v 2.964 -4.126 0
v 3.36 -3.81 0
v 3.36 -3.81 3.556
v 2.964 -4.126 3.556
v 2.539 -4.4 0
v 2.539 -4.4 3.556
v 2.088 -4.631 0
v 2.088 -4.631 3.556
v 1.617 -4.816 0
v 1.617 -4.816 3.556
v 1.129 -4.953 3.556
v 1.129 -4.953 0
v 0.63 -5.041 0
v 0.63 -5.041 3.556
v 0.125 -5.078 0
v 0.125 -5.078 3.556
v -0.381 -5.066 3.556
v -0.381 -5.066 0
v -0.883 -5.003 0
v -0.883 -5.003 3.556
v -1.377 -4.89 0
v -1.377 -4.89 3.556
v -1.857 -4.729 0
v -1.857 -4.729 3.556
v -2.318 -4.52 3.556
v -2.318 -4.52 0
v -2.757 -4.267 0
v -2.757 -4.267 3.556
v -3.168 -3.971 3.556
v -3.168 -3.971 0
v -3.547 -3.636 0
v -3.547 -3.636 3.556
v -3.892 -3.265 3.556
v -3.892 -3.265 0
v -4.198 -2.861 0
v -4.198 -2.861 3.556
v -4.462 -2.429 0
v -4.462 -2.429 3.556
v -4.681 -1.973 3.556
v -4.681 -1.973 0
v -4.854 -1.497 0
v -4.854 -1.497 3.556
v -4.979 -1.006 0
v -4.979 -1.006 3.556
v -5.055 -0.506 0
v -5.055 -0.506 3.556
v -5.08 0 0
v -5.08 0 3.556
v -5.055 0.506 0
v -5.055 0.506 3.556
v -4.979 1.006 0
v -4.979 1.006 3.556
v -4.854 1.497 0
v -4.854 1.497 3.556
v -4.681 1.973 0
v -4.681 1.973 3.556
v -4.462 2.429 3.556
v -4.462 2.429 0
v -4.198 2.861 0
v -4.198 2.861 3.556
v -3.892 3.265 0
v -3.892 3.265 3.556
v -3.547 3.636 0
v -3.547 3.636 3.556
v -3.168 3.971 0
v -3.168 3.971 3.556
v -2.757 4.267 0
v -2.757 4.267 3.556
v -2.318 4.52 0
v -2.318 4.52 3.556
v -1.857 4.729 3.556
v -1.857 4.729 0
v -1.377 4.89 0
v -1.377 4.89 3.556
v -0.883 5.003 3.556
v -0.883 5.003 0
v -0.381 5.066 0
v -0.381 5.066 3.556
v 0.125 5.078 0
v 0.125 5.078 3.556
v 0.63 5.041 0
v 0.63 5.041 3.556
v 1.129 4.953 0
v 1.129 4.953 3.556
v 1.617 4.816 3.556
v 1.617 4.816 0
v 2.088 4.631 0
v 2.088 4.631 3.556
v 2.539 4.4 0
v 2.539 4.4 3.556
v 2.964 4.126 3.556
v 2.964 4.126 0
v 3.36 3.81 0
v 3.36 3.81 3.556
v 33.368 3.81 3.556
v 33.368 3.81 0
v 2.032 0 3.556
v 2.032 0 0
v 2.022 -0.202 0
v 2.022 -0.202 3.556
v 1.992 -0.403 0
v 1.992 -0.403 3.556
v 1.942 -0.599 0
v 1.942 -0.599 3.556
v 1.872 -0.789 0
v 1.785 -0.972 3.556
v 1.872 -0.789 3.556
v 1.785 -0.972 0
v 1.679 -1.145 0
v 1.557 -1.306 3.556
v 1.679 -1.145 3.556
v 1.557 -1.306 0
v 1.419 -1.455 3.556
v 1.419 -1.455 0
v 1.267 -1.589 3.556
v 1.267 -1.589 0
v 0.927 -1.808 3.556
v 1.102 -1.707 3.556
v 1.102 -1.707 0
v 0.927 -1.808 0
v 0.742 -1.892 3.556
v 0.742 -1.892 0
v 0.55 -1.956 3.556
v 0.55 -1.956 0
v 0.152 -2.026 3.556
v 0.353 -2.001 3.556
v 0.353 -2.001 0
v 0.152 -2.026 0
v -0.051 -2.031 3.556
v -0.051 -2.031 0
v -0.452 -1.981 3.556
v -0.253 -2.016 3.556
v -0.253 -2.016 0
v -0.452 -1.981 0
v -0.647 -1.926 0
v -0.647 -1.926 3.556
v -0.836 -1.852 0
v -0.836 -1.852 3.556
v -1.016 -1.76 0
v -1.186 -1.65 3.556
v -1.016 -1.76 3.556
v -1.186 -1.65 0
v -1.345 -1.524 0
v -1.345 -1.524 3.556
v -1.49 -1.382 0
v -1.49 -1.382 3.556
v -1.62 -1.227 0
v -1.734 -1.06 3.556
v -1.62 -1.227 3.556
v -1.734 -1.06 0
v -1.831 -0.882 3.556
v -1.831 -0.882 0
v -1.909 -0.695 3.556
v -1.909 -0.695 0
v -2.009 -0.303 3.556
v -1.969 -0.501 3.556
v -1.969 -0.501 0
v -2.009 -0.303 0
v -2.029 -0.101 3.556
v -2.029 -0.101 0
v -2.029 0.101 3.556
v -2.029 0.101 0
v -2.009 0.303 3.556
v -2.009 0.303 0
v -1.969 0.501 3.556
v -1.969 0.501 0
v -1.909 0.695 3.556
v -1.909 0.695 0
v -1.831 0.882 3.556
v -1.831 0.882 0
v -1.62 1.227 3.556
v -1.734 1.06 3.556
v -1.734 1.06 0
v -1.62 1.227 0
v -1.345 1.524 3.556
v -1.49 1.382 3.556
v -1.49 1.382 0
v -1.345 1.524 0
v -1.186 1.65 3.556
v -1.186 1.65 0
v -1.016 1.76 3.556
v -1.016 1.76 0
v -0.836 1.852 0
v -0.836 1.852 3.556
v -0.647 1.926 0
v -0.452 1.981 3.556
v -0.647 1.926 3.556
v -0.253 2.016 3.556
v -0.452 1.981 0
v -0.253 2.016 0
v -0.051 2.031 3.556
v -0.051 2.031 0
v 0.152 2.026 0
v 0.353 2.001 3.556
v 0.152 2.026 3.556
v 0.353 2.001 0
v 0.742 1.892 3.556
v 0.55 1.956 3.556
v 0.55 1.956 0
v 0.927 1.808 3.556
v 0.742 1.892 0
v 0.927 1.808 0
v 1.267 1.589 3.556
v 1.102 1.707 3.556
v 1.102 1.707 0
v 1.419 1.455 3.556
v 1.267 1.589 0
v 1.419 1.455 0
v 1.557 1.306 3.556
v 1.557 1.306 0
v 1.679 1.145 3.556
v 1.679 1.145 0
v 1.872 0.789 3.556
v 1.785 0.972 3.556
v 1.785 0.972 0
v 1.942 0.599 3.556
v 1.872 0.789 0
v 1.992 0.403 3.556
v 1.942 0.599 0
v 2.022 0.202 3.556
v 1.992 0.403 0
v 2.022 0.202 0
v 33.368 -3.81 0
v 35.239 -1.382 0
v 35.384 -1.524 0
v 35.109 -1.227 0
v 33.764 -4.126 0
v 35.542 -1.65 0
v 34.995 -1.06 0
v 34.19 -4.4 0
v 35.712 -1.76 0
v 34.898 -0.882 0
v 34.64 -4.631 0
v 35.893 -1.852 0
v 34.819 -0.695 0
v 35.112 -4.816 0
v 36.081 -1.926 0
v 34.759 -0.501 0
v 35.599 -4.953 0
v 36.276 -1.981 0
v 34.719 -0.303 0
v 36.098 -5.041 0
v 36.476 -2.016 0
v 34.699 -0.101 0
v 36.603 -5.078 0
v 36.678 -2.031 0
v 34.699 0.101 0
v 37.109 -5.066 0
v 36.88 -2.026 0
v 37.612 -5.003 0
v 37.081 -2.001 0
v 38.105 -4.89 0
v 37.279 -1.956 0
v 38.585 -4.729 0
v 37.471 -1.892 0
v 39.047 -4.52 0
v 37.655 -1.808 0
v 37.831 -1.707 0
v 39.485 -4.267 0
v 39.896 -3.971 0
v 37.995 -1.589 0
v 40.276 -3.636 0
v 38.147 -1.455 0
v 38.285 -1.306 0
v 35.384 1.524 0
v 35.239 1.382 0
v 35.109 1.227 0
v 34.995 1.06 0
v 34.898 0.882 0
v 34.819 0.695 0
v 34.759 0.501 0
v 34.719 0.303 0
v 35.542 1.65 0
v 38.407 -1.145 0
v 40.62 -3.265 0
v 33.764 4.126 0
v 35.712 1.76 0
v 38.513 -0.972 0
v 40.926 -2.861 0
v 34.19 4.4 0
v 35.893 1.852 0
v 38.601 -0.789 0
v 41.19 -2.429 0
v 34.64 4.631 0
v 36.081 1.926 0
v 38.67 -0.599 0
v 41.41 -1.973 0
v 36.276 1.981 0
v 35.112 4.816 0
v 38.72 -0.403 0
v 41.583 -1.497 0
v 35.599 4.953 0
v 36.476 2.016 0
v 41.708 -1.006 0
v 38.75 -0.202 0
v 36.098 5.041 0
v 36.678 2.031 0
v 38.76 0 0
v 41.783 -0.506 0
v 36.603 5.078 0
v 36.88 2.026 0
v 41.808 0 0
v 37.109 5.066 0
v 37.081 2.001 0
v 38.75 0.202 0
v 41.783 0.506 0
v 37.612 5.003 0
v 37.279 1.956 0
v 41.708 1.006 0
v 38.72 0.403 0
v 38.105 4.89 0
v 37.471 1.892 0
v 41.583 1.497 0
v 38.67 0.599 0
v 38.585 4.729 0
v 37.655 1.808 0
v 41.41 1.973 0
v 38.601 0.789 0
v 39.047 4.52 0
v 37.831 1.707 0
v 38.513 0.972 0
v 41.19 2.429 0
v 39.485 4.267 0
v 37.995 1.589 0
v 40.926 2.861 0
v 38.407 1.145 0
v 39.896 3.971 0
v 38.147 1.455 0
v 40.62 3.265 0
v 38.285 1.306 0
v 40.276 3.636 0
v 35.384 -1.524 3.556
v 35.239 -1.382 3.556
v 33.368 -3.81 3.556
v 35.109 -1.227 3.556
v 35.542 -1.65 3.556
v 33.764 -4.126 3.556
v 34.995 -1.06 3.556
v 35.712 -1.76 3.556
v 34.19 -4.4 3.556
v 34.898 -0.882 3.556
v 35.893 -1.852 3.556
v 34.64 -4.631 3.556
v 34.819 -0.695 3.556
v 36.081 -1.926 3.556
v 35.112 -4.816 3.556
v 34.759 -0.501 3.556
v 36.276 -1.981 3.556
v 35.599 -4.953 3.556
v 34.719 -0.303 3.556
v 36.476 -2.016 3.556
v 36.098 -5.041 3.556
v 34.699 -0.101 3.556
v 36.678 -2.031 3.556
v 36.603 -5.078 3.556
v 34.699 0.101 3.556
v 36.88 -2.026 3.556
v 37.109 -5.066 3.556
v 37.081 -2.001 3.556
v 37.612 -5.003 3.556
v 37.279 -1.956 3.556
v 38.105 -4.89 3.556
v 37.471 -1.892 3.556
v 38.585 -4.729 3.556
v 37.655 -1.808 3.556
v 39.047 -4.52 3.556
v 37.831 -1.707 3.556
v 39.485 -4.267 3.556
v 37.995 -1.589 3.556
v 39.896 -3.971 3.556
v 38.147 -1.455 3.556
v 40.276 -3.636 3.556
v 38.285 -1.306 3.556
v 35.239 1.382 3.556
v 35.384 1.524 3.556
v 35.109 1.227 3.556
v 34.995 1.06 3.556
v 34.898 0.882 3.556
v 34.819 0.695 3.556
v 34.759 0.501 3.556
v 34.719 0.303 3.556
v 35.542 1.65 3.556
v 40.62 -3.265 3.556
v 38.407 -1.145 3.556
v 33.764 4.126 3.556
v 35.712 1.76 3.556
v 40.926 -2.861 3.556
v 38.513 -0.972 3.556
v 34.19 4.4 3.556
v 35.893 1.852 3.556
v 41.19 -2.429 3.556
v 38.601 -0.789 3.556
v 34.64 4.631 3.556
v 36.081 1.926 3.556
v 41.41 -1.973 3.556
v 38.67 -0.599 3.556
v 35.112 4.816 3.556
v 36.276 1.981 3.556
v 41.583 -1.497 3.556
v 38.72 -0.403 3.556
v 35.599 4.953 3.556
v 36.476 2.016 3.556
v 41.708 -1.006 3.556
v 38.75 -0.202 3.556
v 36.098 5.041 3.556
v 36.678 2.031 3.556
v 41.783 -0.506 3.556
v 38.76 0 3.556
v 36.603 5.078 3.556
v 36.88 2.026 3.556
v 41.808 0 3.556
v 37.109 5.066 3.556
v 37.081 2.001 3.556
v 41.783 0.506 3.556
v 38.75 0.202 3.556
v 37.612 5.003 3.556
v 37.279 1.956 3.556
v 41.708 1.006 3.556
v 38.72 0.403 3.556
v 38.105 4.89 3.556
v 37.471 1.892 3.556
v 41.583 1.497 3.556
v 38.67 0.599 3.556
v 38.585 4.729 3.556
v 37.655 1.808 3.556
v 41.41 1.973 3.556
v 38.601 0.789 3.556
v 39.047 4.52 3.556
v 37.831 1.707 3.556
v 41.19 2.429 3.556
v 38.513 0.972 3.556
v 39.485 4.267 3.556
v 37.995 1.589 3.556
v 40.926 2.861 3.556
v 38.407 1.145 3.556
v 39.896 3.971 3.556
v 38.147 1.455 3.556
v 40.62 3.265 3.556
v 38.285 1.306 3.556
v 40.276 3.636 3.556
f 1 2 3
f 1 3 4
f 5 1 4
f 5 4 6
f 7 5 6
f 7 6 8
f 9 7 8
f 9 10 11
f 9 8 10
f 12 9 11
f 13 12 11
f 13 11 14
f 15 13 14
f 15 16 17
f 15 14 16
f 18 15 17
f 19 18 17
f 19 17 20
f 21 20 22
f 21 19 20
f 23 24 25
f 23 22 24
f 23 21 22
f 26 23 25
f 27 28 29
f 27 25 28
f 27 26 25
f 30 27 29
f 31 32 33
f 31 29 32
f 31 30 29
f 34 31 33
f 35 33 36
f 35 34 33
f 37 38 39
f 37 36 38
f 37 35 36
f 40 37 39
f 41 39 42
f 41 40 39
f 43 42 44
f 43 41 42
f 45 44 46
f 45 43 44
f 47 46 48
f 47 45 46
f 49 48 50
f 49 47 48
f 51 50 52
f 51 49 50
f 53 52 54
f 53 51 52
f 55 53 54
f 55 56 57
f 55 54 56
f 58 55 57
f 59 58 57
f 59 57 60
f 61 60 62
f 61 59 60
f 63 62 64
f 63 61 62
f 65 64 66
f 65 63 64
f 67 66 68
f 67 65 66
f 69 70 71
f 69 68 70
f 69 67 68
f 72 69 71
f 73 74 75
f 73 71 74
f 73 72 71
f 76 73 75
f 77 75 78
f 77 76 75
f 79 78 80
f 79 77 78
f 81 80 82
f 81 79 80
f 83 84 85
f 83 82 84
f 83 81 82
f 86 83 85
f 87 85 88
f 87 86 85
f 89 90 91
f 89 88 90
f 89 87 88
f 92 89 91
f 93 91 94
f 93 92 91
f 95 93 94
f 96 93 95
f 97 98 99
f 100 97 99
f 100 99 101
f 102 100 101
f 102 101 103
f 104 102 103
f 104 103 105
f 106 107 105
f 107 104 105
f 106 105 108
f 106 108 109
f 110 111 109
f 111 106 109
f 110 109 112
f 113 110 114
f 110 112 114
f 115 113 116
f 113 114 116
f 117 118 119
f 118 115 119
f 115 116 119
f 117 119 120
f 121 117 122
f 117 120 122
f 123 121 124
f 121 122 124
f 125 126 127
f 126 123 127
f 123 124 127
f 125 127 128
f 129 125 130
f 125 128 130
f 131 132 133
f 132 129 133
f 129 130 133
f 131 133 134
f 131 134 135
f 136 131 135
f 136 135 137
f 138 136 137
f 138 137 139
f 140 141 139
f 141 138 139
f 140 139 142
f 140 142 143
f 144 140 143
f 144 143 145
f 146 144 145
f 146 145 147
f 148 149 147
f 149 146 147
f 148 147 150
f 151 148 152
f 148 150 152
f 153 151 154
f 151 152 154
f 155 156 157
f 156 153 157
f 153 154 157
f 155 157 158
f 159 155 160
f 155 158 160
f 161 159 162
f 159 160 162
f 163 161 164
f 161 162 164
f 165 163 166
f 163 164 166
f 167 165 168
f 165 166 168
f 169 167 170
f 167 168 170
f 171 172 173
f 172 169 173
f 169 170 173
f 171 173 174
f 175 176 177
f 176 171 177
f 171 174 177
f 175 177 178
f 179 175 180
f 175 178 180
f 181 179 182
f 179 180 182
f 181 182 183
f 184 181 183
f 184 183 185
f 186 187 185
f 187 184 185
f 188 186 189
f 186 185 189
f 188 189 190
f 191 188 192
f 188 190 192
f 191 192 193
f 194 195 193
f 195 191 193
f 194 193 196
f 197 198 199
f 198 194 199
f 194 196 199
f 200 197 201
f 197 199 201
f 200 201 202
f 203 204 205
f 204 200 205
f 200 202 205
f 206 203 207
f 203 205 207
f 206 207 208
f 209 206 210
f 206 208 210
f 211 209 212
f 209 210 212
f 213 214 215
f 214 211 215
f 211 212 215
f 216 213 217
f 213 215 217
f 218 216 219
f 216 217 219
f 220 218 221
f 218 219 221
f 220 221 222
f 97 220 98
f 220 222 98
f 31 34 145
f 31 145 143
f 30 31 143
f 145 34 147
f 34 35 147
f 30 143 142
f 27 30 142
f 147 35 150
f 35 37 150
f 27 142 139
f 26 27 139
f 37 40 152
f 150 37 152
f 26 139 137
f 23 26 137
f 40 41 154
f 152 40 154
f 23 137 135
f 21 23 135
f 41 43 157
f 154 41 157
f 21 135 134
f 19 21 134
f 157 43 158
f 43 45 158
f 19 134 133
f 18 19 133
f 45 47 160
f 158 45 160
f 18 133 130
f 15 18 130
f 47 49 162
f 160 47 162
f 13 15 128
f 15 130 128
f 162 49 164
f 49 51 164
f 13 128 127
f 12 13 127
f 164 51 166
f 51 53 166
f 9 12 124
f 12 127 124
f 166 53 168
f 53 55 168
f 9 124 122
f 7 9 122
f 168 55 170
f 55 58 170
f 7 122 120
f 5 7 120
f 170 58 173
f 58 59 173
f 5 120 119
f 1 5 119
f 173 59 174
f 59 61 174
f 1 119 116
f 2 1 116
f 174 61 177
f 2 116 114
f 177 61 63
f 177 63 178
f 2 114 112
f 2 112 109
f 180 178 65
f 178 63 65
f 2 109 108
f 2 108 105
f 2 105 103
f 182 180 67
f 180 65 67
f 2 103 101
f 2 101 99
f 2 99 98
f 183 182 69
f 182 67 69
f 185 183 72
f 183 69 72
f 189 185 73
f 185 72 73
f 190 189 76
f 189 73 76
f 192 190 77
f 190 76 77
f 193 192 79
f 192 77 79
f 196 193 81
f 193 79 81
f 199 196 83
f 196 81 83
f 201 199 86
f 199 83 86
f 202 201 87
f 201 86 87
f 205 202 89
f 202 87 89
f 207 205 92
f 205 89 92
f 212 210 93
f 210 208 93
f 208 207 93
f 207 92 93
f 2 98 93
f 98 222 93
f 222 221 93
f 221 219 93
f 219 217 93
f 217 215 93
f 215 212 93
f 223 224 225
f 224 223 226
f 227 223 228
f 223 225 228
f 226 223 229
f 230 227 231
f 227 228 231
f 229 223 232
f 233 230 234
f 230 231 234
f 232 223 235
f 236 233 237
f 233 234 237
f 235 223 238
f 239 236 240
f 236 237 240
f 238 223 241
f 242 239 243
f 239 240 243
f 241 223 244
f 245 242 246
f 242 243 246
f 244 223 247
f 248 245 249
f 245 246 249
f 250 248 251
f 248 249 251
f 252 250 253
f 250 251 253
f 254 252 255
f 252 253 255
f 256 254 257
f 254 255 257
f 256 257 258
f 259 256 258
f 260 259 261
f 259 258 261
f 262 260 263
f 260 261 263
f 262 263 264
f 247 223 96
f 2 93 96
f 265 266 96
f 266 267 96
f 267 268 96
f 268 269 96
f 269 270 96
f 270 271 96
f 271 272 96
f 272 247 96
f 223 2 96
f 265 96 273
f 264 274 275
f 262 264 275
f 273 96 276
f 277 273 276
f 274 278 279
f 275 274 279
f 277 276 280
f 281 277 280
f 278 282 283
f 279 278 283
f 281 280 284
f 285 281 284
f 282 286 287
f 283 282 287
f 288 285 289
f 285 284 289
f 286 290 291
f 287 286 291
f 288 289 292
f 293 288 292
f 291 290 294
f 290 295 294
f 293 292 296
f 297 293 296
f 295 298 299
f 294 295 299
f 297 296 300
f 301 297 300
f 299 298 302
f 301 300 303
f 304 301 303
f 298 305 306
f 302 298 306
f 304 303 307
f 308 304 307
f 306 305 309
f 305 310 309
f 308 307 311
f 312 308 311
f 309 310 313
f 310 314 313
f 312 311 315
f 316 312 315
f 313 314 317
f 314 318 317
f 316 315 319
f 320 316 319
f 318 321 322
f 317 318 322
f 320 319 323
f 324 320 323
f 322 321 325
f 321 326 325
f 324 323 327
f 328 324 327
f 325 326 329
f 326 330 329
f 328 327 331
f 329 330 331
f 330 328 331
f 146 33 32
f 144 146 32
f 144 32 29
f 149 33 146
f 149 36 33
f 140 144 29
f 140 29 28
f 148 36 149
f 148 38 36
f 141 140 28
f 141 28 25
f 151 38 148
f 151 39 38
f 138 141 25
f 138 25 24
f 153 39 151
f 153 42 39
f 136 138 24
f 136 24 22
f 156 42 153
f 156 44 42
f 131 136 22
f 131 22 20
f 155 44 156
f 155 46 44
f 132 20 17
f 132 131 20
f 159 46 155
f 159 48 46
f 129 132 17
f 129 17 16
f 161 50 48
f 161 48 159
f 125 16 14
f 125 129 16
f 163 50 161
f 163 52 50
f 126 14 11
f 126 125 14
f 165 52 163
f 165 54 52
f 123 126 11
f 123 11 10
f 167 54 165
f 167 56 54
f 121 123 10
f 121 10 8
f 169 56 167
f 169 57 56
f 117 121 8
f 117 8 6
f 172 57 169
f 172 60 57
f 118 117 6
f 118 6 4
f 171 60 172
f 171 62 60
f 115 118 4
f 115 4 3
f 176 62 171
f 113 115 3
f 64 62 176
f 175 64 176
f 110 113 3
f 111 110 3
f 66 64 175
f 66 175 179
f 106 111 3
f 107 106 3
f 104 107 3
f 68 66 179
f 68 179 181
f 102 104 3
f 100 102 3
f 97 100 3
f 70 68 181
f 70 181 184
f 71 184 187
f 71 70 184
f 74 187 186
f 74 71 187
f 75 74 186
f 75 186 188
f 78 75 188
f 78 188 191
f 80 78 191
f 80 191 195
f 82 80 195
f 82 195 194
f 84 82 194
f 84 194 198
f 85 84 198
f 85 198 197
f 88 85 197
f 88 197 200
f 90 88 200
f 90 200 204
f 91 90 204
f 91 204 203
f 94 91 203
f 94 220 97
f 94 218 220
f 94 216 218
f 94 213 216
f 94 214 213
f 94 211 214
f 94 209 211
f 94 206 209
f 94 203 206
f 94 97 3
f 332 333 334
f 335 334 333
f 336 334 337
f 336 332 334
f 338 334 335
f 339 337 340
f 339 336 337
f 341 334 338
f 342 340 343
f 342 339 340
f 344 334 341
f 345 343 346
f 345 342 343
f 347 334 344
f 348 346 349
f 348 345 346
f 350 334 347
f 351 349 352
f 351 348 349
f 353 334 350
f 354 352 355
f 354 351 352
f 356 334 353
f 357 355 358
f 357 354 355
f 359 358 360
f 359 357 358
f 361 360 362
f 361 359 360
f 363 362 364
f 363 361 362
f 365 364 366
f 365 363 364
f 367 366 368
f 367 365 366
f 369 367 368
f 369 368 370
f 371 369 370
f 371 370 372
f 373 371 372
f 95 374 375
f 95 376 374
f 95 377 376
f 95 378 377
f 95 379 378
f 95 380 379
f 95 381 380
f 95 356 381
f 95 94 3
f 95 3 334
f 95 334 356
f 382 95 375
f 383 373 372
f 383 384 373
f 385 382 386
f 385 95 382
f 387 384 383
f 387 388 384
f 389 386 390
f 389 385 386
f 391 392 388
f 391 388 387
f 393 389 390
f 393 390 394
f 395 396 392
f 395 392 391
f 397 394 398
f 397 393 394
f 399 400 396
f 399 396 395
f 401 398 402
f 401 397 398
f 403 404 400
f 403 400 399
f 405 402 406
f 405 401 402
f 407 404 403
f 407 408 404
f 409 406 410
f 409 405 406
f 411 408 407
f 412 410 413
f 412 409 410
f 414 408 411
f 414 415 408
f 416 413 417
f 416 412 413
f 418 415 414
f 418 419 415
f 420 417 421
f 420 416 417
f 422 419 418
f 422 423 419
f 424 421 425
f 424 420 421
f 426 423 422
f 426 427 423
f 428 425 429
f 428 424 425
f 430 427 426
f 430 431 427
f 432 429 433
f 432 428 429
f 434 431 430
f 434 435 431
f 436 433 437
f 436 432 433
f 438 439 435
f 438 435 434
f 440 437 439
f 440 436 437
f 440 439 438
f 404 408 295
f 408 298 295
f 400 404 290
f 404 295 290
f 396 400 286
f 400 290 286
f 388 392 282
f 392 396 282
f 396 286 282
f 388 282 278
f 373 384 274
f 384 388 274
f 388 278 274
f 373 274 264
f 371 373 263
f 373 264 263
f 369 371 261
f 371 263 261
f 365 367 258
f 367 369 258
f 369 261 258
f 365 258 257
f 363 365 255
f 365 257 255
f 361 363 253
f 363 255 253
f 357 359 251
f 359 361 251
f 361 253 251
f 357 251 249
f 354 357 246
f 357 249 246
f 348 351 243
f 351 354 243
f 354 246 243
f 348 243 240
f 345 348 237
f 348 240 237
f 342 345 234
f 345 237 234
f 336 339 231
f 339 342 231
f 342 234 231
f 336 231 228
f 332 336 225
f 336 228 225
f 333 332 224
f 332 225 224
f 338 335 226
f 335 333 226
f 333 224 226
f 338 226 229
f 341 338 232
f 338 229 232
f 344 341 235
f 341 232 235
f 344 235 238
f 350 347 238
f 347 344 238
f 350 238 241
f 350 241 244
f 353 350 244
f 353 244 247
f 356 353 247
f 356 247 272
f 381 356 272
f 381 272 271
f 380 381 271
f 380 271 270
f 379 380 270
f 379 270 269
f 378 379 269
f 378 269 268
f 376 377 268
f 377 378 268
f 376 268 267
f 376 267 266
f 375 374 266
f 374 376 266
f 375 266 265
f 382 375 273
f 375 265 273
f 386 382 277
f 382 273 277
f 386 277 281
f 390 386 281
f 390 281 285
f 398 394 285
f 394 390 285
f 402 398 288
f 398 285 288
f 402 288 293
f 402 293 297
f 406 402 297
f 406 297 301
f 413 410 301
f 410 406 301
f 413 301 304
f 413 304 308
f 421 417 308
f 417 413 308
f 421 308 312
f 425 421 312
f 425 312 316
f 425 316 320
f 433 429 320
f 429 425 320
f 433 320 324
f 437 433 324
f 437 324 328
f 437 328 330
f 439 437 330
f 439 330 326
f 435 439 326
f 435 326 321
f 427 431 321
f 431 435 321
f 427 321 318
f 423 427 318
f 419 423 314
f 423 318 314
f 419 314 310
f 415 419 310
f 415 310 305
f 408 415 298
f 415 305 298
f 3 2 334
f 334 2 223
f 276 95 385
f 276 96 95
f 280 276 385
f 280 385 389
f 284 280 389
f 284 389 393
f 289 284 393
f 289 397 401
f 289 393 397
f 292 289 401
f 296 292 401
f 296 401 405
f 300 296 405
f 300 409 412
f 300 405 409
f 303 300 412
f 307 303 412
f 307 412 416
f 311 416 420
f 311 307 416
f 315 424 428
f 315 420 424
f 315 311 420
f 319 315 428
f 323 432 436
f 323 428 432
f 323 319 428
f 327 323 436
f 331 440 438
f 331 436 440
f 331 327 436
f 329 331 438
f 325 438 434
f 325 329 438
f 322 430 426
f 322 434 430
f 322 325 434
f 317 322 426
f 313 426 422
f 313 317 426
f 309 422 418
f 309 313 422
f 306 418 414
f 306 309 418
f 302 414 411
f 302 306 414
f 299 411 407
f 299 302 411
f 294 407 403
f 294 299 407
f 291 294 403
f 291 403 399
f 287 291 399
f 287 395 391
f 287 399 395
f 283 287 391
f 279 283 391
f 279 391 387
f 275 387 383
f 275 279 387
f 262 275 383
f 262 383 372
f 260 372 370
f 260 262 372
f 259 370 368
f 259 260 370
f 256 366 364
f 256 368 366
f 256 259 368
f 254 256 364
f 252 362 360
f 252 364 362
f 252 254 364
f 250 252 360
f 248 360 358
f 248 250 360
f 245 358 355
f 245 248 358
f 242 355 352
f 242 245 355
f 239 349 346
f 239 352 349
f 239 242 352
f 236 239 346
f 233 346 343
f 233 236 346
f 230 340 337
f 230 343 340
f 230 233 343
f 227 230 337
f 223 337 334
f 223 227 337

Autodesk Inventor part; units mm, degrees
ref_plane "YZ Plane" through (0, 0, 0) normal (1, 0, 0) x (0, 1, 0)
ref_plane "XZ Plane" through (0, 0, 0) normal (0, 1, 0) x (-1, 0, 0)
ref_plane "XY Plane" through (0, 0, 0) normal (0, 0, 1) x (1, 0, 0)
sketch "Sketch1" plane through (0, 0, 0) normal (0, 0, 1) x (1, 0, 0)
  arc A0 (3.3601, 3.81) -> (3.3601, -3.81) centre (0, 0) ccw
  circle A1 centre (0, 0) radius 2.032
  line L0 (3.3601, 3.81) -> (33.3683, 3.81)
  line L1 (3.3601, -3.81) -> (33.3683, -3.81)
  arc A2 (33.3683, -3.81) -> (33.3683, 3.81) centre (36.7284, 0) ccw
  circle A3 centre (36.7284, 0) radius 2.032
  dimension "d0" = 10.16
  dimension "d1" = 4.064
  dimension "d2" = 7.62
  dimension "d3" = 3.81
  dimension "d4" = 10.16
  dimension "d5" = 4.064
  dimension "d6" = 36.7284
extrude "Extrusion1" add sketch "Sketch1" along normal blind 3.556
equation "\"d5\" = d1"
properties part number "Arm 3"
